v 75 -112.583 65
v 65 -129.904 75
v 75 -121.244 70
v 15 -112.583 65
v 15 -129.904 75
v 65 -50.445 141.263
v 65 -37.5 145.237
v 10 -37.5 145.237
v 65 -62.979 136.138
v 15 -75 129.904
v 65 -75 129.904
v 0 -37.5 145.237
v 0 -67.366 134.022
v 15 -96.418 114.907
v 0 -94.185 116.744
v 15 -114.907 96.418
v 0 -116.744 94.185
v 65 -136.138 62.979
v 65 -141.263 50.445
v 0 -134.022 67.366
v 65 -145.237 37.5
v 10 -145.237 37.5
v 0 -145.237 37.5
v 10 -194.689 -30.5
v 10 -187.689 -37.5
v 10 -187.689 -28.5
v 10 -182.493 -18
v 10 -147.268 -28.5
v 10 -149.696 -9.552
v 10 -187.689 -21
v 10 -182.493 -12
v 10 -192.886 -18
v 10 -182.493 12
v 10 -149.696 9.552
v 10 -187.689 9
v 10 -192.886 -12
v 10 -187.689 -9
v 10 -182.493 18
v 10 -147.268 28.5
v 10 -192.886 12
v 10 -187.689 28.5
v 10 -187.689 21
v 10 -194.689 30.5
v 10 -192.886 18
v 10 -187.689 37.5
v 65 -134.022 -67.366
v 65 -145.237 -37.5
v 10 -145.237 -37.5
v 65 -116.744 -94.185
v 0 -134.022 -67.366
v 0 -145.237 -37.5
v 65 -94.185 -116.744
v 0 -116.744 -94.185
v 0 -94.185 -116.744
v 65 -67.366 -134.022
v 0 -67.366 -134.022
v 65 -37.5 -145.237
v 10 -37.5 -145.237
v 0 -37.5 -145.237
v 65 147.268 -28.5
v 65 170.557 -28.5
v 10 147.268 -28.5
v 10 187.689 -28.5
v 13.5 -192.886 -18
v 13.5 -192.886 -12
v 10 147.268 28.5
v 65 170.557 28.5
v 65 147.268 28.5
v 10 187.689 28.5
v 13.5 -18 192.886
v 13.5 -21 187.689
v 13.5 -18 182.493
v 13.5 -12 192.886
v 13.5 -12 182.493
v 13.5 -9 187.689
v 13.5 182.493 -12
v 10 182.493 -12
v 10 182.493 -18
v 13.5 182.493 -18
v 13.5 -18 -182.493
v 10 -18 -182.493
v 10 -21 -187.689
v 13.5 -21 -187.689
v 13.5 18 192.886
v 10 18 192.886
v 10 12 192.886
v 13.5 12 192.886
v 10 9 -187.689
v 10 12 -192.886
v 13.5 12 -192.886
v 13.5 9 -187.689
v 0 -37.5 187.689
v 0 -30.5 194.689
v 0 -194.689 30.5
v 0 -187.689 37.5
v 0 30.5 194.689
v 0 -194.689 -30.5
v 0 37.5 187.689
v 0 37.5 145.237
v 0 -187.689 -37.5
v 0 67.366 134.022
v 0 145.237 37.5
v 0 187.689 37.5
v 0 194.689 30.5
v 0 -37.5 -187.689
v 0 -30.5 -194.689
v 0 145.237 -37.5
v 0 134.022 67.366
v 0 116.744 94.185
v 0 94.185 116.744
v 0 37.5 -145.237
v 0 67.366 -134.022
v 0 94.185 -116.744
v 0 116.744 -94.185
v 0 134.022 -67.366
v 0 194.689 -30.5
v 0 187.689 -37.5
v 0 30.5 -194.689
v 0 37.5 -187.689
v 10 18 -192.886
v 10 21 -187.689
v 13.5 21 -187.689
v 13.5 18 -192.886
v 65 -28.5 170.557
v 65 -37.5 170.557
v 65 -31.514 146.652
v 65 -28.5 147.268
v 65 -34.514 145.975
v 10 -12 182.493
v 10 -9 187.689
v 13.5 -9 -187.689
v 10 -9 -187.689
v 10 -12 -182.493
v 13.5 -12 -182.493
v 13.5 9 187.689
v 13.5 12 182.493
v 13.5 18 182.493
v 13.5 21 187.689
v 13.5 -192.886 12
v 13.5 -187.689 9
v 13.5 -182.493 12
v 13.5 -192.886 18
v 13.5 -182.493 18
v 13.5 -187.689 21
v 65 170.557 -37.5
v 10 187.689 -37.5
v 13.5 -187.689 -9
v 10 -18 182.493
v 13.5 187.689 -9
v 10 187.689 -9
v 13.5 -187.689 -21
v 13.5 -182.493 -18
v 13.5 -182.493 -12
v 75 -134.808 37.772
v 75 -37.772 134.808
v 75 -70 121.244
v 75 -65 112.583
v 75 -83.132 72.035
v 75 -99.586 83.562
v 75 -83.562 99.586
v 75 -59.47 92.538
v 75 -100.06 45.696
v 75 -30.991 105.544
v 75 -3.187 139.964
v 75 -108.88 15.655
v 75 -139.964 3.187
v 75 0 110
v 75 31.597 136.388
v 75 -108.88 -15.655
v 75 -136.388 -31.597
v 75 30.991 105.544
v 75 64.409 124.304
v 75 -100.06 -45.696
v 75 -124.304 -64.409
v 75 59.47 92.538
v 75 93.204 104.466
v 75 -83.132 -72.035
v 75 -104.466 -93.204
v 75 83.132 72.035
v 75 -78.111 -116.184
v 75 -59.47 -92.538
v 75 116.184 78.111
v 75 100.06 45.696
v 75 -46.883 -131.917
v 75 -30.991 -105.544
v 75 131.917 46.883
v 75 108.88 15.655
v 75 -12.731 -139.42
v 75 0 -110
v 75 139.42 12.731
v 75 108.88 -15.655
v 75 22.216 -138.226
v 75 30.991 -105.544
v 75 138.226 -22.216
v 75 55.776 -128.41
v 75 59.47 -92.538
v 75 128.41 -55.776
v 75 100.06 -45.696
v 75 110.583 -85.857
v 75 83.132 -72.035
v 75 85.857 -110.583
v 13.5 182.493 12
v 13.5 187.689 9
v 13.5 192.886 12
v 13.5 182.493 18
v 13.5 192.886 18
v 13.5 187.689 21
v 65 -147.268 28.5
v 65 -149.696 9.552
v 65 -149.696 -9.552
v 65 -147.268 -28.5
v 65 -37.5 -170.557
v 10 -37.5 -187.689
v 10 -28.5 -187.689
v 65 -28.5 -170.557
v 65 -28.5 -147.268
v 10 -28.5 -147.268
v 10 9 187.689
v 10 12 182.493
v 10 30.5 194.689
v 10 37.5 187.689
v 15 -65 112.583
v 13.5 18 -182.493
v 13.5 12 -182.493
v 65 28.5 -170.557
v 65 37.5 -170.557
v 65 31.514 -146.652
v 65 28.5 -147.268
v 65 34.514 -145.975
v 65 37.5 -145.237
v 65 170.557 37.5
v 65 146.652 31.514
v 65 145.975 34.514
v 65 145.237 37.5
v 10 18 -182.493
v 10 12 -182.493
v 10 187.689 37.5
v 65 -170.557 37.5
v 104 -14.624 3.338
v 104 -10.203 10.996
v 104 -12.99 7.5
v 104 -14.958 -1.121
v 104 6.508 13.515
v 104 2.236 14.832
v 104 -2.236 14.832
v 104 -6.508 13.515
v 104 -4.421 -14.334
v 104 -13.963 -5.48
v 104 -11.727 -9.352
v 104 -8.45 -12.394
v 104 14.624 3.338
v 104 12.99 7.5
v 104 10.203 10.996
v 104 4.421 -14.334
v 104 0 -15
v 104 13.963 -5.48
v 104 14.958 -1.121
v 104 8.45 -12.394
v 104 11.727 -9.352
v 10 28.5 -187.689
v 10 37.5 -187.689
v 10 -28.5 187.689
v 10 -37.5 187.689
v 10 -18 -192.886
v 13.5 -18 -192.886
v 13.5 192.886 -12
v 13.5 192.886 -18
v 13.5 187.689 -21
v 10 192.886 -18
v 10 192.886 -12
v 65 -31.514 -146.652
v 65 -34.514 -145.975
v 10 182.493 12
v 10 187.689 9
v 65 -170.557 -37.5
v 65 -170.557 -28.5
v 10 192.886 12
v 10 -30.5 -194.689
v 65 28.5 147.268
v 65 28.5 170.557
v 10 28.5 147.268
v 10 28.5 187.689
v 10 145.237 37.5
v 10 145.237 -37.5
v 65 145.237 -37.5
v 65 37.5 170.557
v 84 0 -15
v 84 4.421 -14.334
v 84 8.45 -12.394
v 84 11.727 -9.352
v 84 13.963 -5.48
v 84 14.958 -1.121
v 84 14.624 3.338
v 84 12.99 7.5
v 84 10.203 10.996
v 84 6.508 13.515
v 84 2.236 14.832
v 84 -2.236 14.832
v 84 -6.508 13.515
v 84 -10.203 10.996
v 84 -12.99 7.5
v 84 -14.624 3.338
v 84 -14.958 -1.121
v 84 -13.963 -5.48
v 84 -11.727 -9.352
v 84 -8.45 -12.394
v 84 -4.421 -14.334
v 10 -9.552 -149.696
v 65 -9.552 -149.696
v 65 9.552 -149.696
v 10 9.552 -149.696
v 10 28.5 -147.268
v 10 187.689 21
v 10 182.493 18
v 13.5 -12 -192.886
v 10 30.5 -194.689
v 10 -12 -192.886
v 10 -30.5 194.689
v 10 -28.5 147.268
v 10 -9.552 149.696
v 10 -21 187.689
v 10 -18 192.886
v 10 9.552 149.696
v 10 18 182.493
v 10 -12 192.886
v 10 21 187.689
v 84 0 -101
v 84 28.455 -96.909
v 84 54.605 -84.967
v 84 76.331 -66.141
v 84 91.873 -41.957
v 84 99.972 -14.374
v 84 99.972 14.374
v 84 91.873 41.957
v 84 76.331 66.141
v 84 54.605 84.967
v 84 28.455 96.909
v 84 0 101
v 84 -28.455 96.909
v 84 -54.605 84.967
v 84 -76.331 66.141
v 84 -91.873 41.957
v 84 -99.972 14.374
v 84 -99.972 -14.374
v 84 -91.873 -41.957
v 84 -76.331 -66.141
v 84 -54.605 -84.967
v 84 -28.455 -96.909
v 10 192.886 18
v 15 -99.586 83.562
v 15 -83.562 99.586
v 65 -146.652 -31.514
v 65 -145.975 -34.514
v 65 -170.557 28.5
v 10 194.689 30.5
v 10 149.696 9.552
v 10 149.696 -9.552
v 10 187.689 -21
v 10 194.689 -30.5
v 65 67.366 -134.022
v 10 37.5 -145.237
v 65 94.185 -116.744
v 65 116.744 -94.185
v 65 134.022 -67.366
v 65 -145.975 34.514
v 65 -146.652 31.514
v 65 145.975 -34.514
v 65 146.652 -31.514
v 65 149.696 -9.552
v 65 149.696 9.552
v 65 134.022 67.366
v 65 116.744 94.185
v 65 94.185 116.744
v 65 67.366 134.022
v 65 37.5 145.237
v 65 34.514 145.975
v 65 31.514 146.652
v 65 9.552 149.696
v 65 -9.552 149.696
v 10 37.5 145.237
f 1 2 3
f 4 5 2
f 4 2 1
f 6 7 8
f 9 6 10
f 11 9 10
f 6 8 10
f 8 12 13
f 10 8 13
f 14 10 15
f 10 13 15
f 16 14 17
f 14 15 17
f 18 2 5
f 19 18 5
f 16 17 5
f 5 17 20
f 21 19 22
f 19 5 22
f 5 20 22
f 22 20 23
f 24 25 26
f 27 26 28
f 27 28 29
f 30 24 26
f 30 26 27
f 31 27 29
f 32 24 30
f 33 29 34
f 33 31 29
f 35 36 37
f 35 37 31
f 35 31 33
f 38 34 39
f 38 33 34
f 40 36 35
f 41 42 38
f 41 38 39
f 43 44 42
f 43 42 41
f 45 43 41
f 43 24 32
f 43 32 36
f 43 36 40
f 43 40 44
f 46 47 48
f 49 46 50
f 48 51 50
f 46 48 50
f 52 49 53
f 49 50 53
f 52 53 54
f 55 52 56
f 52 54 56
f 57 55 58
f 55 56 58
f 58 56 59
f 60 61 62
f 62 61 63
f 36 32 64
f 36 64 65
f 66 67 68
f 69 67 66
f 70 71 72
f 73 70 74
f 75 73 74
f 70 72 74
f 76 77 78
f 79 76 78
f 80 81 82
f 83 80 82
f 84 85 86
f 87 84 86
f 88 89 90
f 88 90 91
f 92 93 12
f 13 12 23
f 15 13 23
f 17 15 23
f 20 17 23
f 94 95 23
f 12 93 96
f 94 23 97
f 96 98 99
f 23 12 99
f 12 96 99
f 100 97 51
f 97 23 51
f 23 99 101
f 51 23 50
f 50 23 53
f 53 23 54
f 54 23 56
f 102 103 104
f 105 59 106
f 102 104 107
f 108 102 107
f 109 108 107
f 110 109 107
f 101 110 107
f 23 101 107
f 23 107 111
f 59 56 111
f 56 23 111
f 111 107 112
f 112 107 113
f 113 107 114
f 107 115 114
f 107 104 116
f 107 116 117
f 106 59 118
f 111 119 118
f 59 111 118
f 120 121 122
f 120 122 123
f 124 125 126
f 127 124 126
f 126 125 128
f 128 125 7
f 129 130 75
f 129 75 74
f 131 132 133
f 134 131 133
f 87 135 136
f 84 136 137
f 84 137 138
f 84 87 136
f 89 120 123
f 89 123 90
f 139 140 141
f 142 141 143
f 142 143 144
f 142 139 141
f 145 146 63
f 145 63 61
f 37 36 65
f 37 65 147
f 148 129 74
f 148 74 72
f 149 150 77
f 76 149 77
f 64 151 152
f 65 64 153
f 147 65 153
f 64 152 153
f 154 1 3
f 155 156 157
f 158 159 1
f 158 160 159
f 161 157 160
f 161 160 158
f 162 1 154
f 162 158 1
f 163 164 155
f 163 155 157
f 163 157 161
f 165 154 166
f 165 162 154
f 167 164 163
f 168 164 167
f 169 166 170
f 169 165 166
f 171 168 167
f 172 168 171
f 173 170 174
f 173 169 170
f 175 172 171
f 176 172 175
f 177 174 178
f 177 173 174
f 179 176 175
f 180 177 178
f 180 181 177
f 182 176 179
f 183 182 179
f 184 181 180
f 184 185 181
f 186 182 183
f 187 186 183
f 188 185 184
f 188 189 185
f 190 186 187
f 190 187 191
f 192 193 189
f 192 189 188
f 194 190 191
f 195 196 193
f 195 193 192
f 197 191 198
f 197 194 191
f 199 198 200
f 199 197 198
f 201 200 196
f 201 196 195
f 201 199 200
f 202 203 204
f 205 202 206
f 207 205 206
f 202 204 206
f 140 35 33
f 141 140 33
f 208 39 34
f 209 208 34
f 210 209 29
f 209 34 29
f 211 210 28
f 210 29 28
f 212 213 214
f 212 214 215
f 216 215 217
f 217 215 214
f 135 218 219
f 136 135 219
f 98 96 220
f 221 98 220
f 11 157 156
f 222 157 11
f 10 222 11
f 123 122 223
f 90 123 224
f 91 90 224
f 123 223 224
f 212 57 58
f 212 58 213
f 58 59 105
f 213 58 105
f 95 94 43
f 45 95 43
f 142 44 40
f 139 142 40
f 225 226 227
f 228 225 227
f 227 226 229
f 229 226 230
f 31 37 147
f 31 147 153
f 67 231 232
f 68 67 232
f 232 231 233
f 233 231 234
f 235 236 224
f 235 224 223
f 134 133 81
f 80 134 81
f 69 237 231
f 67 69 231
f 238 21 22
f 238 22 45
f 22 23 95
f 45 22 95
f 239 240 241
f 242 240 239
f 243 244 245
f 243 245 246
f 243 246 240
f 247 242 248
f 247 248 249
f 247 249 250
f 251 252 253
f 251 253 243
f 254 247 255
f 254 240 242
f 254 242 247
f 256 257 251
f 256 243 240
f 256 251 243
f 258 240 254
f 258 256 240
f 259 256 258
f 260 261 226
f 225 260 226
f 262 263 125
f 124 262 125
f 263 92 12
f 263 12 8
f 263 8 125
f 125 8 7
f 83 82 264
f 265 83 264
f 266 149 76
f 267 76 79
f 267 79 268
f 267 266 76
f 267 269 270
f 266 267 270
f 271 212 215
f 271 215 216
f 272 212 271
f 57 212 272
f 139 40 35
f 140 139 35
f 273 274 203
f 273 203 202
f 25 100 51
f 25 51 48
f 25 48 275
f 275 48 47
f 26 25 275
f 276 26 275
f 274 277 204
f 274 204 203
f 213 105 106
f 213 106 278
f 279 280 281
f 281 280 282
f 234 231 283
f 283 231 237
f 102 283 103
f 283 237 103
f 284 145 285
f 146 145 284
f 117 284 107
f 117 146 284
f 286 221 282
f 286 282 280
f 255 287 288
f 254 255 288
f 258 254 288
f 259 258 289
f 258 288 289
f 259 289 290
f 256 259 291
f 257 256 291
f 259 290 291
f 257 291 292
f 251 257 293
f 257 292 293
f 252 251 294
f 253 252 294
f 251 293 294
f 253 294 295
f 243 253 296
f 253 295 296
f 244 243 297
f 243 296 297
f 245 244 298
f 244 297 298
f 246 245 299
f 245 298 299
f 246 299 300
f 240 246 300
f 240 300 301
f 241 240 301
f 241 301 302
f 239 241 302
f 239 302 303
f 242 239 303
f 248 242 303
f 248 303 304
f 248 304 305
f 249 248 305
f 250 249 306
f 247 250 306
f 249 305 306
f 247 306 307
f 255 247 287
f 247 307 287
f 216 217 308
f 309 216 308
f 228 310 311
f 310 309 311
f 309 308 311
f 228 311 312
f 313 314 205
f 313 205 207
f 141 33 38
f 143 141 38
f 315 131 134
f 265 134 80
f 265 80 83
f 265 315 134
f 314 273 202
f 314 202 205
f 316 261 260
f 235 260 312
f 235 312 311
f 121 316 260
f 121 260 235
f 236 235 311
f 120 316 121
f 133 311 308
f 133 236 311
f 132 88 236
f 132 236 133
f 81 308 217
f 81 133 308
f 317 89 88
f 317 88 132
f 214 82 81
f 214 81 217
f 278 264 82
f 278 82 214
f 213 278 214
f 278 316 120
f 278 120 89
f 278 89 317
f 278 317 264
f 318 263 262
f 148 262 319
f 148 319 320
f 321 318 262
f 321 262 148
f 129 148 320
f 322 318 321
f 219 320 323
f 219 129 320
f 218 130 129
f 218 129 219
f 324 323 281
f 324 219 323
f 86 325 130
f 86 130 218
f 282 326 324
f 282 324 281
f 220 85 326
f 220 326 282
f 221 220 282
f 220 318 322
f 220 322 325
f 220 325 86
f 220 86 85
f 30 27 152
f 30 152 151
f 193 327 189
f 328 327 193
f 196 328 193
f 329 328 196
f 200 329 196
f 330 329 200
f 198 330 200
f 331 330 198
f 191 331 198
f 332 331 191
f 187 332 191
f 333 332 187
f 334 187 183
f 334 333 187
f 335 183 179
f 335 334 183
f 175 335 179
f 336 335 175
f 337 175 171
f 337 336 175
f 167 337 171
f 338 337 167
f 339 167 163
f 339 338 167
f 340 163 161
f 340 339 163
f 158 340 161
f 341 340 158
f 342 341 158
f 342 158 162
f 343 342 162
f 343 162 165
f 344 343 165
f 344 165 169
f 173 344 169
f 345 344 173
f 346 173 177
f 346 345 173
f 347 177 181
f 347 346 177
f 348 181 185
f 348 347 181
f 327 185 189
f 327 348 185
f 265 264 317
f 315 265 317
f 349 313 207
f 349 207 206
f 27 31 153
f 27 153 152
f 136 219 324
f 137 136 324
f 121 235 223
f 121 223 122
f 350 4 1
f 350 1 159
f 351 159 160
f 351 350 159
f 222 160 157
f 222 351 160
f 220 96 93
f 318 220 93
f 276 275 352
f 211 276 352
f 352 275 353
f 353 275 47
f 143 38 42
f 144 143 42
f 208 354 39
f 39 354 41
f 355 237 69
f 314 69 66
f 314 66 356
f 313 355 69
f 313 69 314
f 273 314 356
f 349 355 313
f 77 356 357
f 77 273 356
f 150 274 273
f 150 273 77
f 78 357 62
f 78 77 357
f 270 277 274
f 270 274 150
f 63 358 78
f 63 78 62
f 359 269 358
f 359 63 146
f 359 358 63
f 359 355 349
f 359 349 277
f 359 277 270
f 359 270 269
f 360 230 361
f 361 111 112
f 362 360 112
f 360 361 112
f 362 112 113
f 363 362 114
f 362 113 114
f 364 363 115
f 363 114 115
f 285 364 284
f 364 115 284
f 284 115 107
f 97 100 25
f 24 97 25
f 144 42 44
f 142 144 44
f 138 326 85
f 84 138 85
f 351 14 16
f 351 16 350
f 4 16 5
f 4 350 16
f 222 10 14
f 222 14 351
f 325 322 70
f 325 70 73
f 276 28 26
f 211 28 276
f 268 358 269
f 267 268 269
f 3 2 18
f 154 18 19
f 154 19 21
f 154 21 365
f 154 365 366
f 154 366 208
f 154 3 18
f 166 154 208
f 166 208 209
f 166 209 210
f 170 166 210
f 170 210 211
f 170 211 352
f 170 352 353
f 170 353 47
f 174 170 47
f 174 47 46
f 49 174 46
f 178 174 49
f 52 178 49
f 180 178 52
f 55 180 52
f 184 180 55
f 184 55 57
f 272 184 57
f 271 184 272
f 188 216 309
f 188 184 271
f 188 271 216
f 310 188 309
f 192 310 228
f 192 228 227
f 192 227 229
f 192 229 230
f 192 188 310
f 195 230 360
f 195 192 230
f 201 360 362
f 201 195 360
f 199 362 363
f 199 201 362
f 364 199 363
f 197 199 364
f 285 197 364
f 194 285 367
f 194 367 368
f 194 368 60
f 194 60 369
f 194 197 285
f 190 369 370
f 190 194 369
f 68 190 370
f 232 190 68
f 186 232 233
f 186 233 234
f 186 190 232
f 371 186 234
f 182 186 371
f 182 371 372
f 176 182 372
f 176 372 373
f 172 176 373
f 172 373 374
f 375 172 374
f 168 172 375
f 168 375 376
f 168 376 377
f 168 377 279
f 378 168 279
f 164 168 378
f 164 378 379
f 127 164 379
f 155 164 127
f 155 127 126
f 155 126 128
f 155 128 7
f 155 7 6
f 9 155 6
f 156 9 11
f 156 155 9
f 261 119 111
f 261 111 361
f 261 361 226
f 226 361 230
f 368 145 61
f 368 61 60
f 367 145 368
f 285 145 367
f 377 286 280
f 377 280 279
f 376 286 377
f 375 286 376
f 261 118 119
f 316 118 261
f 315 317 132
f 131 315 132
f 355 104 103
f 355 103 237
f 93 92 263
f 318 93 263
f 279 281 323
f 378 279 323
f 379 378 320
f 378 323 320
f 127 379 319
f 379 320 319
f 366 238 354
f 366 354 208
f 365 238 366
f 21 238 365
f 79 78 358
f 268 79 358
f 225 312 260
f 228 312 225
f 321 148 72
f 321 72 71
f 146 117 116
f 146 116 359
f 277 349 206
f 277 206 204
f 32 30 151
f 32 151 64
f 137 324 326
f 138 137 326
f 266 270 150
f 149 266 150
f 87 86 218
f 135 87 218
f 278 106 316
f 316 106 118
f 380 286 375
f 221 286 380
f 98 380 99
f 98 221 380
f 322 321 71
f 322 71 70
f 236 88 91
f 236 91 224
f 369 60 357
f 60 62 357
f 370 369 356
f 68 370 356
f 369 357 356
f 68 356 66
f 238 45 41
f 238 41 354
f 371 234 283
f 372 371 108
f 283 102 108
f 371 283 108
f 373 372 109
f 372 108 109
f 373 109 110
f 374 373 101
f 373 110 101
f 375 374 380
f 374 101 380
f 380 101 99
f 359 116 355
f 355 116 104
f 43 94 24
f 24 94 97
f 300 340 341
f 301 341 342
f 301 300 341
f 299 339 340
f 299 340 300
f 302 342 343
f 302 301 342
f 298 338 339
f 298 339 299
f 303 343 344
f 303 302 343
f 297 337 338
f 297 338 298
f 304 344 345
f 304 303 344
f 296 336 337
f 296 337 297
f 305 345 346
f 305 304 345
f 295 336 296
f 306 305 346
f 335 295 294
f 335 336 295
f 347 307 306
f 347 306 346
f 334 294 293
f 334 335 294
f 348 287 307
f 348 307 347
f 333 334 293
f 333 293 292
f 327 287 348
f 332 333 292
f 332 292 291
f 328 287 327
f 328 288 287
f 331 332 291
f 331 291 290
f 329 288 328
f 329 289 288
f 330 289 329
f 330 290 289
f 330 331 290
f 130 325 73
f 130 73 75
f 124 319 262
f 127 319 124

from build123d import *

# Parameters (mm, degrees)
SKETCH2_R                    = 150
BOSS_EXTRUDE1_DEPTH          = 75
CHAMFER1_SIZE                = 10
BOSS_EXTRUDE2_DEPTH          = 10
CHAMFER2_SIZE                = 7
BOSS_EXTRUDE3_DEPTH          = 9
BOSS_EXTRUDE4_DEPTH          = 3.5
CIRPATTERN1_COUNT            = 4
CIRPATTERN1_COPY_1_DEPTH     = 3.5
CIRPATTERN1_COPY_2_DEPTH     = 3.5
CIRPATTERN1_COPY_3_DEPTH     = 3.5
CIRPATTERN1_COPY_4_DEPTH     = 9
CIRPATTERN1_COPY_5_DEPTH     = 9
CIRPATTERN1_COPY_6_DEPTH     = 9
CHAMFER2_OF_CIRPATTERN1_SIZE = 7
CUT_EXTRUDE1_START           = -60
CUT_EXTRUDE1_DEPTH           = 60
SKETCH8_R                    = 110
BOSS_EXTRUDE5_DEPTH          = 9
BOSS_EXTRUDE5_TAPER          = 45
SKETCH9_R                    = 15
BOSS_EXTRUDE6_DEPTH          = 20


with BuildPart() as part:
    # Sketch2 → Boss-Extrude1 (new body)
    with BuildSketch(Plane(origin=(0, 0, 0), x_dir=(0, 0, -1), z_dir=(1, 0, 0))):
        Circle(SKETCH2_R)
    extrude(amount=BOSS_EXTRUDE1_DEPTH)

    # Chamfer1
    chamfer1_edges = [part.edges().sort_by_distance(p)[0] for p in [
        (75, 0, 150),
    ]]
    chamfer(chamfer1_edges, length=CHAMFER1_SIZE)

    # Sketch3 → Boss-Extrude2 (add)
    with BuildSketch(Plane.ZY):
        with BuildLine():
            Line((-37.5, 144.689485183), (-37.5, 194.689485183))
            Line((-37.5, 194.689485183), (37.5, 194.689485183))
            Line((37.5, 194.689485183), (37.5, 144.689485183))
            ThreePointArc((37.5, 144.689485183), (0, 149.470054267), (-37.5, 144.689485183))
        make_face()
    boss_extrude2 = extrude(amount=-BOSS_EXTRUDE2_DEPTH)

    # Chamfer2
    chamfer2_edges = [part.edges().sort_by_distance(p)[0] for p in [
        (5, 194.689485183, 37.5),
        (5, 194.689485183, -37.5),
    ]]
    chamfer(chamfer2_edges, length=CHAMFER2_SIZE)

    # Sketch4 → Boss-Extrude3 (add)
    with BuildSketch(Plane(origin=(0, 0, -37.5), x_dir=(-1, 0, 0), z_dir=(0, 0, -1))):
        Polygon((-10, 145.236875483), (-10, 187.689485183), (-65, 170.556875483), (-65, 145.236875483), align=None)
    boss_extrude3 = extrude(amount=-BOSS_EXTRUDE3_DEPTH)

    # Sketch5 → Boss-Extrude4 (add)
    with BuildSketch(Plane(origin=(10, 0, 0), x_dir=(0, 0, -1), z_dir=(1, 0, 0))):
        Polygon((21, 187.689485183), (18, 192.885637605), (12, 192.885637605), (9, 187.689485183), (12, 182.49333276), (18, 182.49333276), align=None)
    boss_extrude4 = extrude(amount=BOSS_EXTRUDE4_DEPTH)

    # Mirror1: Boss-Extrude4 across plane
    add(boss_extrude4.mirror(Plane.XY))

    # Mirror2: Boss-Extrude3 across plane
    add(boss_extrude3.mirror(Plane.XY))

    # CirPattern1: Boss-Extrude2, Boss-Extrude3, Boss-Extrude4 ×4 about axis
    cirpattern1_axis = Axis((0, 0, 0), (1, 0, 0))
    add([boss_extrude2.rotate(cirpattern1_axis, i * 360 / CIRPATTERN1_COUNT) for i in range(1, CIRPATTERN1_COUNT)])
    add([boss_extrude3.rotate(cirpattern1_axis, i * 360 / CIRPATTERN1_COUNT) for i in range(1, CIRPATTERN1_COUNT)])
    add([boss_extrude4.rotate(cirpattern1_axis, i * 360 / CIRPATTERN1_COUNT) for i in range(1, CIRPATTERN1_COUNT)])

    # CirPattern1 copy 1 sketch → CirPattern1 copy 1 (add)
    with BuildSketch(Plane(origin=(10, 0, 0), x_dir=(0, -1, 0), z_dir=(1, 0, 0))):
        Polygon((21, -187.689485183), (18, -192.885637605), (12, -192.885637605), (9, -187.689485183), (12, -182.49333276), (18, -182.49333276), align=None)
    extrude(amount=CIRPATTERN1_COPY_1_DEPTH)

    # CirPattern1 copy 2 sketch → CirPattern1 copy 2 (add)
    with BuildSketch(Plane(origin=(10, 0, 0), x_dir=(0, 0, -1), z_dir=(1, 0, 0))):
        Polygon((21, -187.689485183), (18, -192.885637605), (12, -192.885637605), (9, -187.689485183), (12, -182.49333276), (18, -182.49333276), align=None)
    extrude(amount=CIRPATTERN1_COPY_2_DEPTH)

    # CirPattern1 copy 3 sketch → CirPattern1 copy 3 (add)
    with BuildSketch(Plane.YZ.offset(10)):
        Polygon((21, -187.689485183), (18, -192.885637605), (12, -192.885637605), (9, -187.689485183), (12, -182.49333276), (18, -182.49333276), align=None)
    extrude(amount=CIRPATTERN1_COPY_3_DEPTH)

    # CirPattern1 copy 4 sketch → CirPattern1 copy 4 (add)
    with BuildSketch(Plane(origin=(0, -37.5, 0), x_dir=(-1, 0, 0), z_dir=(0, -1, 0))):
        Polygon((-10, -145.236875483), (-10, -187.689485183), (-65, -170.556875483), (-65, -145.236875483), align=None)
    extrude(amount=-CIRPATTERN1_COPY_4_DEPTH)

    # CirPattern1 copy 5 sketch → CirPattern1 copy 5 (add)
    with BuildSketch(Plane(origin=(0, 0, -37.5), x_dir=(-1, 0, 0), z_dir=(0, 0, -1))):
        Polygon((-10, -145.236875483), (-10, -187.689485183), (-65, -170.556875483), (-65, -145.236875483), align=None)
    extrude(amount=-CIRPATTERN1_COPY_5_DEPTH)

    # CirPattern1 copy 6 sketch → CirPattern1 copy 6 (add)
    with BuildSketch(Plane(origin=(0, 37.5, 0), x_dir=(-1, 0, 0), z_dir=(0, 1, 0))):
        Polygon((-10, -145.236875483), (-10, -187.689485183), (-65, -170.556875483), (-65, -145.236875483), align=None)
    extrude(amount=-CIRPATTERN1_COPY_6_DEPTH)

    # Chamfer2 of CirPattern1
    chamfer2_of_cirpattern1_edges = [part.edges().sort_by_distance(p)[0] for p in [
        (5, -37.5, 194.689485183),
        (5, 37.5, 194.689485183),
        (5, -194.689485183, -37.5),
        (5, -194.689485183, 37.5),
        (5, 37.5, -194.689485183),
        (5, -37.5, -194.689485183),
    ]]
    chamfer(chamfer2_of_cirpattern1_edges, length=CHAMFER2_OF_CIRPATTERN1_SIZE)

    # Sketch7 → Cut-Extrude1 (cut)
    with BuildSketch(Plane(origin=(75, 0, 0), x_dir=(0, 0, -1), z_dir=(1, 0, 0)).offset(CUT_EXTRUDE1_START)):
        with BuildLine():
            ThreePointArc((-70, -121.24355653), (-98.994949366, -98.994949366), (-121.24355653, -70))
            Line((-121.24355653, -70), (-129.903810568, -75))
            ThreePointArc((-129.903810568, -75), (-106.066017178, -106.066017178), (-75, -129.903810568))
            Line((-75, -129.903810568), (-70, -121.24355653))
        make_face()
        with BuildLine():
            ThreePointArc((-65, -112.583302492), (-91.923881554, -91.923881554), (-112.583302492, -65))
            Line((-112.583302492, -65), (-121.24355653, -70))
            ThreePointArc((-121.24355653, -70), (-98.994949366, -98.994949366), (-70, -121.24355653))
            Line((-70, -121.24355653), (-65, -112.583302492))
        make_face()
    extrude(amount=CUT_EXTRUDE1_DEPTH, mode=Mode.SUBTRACT)

    # Sketch8 → Boss-Extrude5 (add)
    with BuildSketch(Plane(origin=(75, 0, 0), x_dir=(0, 0, -1), z_dir=(1, 0, 0))):
        Circle(SKETCH8_R)
    extrude(amount=BOSS_EXTRUDE5_DEPTH, taper=BOSS_EXTRUDE5_TAPER)

    # Sketch9 → Boss-Extrude6 (add)
    with BuildSketch(Plane(origin=(84, 0, 0), x_dir=(0, 0, -1), z_dir=(1, 0, 0))):
        Circle(SKETCH9_R)
    extrude(amount=BOSS_EXTRUDE6_DEPTH)


solid = part.part
